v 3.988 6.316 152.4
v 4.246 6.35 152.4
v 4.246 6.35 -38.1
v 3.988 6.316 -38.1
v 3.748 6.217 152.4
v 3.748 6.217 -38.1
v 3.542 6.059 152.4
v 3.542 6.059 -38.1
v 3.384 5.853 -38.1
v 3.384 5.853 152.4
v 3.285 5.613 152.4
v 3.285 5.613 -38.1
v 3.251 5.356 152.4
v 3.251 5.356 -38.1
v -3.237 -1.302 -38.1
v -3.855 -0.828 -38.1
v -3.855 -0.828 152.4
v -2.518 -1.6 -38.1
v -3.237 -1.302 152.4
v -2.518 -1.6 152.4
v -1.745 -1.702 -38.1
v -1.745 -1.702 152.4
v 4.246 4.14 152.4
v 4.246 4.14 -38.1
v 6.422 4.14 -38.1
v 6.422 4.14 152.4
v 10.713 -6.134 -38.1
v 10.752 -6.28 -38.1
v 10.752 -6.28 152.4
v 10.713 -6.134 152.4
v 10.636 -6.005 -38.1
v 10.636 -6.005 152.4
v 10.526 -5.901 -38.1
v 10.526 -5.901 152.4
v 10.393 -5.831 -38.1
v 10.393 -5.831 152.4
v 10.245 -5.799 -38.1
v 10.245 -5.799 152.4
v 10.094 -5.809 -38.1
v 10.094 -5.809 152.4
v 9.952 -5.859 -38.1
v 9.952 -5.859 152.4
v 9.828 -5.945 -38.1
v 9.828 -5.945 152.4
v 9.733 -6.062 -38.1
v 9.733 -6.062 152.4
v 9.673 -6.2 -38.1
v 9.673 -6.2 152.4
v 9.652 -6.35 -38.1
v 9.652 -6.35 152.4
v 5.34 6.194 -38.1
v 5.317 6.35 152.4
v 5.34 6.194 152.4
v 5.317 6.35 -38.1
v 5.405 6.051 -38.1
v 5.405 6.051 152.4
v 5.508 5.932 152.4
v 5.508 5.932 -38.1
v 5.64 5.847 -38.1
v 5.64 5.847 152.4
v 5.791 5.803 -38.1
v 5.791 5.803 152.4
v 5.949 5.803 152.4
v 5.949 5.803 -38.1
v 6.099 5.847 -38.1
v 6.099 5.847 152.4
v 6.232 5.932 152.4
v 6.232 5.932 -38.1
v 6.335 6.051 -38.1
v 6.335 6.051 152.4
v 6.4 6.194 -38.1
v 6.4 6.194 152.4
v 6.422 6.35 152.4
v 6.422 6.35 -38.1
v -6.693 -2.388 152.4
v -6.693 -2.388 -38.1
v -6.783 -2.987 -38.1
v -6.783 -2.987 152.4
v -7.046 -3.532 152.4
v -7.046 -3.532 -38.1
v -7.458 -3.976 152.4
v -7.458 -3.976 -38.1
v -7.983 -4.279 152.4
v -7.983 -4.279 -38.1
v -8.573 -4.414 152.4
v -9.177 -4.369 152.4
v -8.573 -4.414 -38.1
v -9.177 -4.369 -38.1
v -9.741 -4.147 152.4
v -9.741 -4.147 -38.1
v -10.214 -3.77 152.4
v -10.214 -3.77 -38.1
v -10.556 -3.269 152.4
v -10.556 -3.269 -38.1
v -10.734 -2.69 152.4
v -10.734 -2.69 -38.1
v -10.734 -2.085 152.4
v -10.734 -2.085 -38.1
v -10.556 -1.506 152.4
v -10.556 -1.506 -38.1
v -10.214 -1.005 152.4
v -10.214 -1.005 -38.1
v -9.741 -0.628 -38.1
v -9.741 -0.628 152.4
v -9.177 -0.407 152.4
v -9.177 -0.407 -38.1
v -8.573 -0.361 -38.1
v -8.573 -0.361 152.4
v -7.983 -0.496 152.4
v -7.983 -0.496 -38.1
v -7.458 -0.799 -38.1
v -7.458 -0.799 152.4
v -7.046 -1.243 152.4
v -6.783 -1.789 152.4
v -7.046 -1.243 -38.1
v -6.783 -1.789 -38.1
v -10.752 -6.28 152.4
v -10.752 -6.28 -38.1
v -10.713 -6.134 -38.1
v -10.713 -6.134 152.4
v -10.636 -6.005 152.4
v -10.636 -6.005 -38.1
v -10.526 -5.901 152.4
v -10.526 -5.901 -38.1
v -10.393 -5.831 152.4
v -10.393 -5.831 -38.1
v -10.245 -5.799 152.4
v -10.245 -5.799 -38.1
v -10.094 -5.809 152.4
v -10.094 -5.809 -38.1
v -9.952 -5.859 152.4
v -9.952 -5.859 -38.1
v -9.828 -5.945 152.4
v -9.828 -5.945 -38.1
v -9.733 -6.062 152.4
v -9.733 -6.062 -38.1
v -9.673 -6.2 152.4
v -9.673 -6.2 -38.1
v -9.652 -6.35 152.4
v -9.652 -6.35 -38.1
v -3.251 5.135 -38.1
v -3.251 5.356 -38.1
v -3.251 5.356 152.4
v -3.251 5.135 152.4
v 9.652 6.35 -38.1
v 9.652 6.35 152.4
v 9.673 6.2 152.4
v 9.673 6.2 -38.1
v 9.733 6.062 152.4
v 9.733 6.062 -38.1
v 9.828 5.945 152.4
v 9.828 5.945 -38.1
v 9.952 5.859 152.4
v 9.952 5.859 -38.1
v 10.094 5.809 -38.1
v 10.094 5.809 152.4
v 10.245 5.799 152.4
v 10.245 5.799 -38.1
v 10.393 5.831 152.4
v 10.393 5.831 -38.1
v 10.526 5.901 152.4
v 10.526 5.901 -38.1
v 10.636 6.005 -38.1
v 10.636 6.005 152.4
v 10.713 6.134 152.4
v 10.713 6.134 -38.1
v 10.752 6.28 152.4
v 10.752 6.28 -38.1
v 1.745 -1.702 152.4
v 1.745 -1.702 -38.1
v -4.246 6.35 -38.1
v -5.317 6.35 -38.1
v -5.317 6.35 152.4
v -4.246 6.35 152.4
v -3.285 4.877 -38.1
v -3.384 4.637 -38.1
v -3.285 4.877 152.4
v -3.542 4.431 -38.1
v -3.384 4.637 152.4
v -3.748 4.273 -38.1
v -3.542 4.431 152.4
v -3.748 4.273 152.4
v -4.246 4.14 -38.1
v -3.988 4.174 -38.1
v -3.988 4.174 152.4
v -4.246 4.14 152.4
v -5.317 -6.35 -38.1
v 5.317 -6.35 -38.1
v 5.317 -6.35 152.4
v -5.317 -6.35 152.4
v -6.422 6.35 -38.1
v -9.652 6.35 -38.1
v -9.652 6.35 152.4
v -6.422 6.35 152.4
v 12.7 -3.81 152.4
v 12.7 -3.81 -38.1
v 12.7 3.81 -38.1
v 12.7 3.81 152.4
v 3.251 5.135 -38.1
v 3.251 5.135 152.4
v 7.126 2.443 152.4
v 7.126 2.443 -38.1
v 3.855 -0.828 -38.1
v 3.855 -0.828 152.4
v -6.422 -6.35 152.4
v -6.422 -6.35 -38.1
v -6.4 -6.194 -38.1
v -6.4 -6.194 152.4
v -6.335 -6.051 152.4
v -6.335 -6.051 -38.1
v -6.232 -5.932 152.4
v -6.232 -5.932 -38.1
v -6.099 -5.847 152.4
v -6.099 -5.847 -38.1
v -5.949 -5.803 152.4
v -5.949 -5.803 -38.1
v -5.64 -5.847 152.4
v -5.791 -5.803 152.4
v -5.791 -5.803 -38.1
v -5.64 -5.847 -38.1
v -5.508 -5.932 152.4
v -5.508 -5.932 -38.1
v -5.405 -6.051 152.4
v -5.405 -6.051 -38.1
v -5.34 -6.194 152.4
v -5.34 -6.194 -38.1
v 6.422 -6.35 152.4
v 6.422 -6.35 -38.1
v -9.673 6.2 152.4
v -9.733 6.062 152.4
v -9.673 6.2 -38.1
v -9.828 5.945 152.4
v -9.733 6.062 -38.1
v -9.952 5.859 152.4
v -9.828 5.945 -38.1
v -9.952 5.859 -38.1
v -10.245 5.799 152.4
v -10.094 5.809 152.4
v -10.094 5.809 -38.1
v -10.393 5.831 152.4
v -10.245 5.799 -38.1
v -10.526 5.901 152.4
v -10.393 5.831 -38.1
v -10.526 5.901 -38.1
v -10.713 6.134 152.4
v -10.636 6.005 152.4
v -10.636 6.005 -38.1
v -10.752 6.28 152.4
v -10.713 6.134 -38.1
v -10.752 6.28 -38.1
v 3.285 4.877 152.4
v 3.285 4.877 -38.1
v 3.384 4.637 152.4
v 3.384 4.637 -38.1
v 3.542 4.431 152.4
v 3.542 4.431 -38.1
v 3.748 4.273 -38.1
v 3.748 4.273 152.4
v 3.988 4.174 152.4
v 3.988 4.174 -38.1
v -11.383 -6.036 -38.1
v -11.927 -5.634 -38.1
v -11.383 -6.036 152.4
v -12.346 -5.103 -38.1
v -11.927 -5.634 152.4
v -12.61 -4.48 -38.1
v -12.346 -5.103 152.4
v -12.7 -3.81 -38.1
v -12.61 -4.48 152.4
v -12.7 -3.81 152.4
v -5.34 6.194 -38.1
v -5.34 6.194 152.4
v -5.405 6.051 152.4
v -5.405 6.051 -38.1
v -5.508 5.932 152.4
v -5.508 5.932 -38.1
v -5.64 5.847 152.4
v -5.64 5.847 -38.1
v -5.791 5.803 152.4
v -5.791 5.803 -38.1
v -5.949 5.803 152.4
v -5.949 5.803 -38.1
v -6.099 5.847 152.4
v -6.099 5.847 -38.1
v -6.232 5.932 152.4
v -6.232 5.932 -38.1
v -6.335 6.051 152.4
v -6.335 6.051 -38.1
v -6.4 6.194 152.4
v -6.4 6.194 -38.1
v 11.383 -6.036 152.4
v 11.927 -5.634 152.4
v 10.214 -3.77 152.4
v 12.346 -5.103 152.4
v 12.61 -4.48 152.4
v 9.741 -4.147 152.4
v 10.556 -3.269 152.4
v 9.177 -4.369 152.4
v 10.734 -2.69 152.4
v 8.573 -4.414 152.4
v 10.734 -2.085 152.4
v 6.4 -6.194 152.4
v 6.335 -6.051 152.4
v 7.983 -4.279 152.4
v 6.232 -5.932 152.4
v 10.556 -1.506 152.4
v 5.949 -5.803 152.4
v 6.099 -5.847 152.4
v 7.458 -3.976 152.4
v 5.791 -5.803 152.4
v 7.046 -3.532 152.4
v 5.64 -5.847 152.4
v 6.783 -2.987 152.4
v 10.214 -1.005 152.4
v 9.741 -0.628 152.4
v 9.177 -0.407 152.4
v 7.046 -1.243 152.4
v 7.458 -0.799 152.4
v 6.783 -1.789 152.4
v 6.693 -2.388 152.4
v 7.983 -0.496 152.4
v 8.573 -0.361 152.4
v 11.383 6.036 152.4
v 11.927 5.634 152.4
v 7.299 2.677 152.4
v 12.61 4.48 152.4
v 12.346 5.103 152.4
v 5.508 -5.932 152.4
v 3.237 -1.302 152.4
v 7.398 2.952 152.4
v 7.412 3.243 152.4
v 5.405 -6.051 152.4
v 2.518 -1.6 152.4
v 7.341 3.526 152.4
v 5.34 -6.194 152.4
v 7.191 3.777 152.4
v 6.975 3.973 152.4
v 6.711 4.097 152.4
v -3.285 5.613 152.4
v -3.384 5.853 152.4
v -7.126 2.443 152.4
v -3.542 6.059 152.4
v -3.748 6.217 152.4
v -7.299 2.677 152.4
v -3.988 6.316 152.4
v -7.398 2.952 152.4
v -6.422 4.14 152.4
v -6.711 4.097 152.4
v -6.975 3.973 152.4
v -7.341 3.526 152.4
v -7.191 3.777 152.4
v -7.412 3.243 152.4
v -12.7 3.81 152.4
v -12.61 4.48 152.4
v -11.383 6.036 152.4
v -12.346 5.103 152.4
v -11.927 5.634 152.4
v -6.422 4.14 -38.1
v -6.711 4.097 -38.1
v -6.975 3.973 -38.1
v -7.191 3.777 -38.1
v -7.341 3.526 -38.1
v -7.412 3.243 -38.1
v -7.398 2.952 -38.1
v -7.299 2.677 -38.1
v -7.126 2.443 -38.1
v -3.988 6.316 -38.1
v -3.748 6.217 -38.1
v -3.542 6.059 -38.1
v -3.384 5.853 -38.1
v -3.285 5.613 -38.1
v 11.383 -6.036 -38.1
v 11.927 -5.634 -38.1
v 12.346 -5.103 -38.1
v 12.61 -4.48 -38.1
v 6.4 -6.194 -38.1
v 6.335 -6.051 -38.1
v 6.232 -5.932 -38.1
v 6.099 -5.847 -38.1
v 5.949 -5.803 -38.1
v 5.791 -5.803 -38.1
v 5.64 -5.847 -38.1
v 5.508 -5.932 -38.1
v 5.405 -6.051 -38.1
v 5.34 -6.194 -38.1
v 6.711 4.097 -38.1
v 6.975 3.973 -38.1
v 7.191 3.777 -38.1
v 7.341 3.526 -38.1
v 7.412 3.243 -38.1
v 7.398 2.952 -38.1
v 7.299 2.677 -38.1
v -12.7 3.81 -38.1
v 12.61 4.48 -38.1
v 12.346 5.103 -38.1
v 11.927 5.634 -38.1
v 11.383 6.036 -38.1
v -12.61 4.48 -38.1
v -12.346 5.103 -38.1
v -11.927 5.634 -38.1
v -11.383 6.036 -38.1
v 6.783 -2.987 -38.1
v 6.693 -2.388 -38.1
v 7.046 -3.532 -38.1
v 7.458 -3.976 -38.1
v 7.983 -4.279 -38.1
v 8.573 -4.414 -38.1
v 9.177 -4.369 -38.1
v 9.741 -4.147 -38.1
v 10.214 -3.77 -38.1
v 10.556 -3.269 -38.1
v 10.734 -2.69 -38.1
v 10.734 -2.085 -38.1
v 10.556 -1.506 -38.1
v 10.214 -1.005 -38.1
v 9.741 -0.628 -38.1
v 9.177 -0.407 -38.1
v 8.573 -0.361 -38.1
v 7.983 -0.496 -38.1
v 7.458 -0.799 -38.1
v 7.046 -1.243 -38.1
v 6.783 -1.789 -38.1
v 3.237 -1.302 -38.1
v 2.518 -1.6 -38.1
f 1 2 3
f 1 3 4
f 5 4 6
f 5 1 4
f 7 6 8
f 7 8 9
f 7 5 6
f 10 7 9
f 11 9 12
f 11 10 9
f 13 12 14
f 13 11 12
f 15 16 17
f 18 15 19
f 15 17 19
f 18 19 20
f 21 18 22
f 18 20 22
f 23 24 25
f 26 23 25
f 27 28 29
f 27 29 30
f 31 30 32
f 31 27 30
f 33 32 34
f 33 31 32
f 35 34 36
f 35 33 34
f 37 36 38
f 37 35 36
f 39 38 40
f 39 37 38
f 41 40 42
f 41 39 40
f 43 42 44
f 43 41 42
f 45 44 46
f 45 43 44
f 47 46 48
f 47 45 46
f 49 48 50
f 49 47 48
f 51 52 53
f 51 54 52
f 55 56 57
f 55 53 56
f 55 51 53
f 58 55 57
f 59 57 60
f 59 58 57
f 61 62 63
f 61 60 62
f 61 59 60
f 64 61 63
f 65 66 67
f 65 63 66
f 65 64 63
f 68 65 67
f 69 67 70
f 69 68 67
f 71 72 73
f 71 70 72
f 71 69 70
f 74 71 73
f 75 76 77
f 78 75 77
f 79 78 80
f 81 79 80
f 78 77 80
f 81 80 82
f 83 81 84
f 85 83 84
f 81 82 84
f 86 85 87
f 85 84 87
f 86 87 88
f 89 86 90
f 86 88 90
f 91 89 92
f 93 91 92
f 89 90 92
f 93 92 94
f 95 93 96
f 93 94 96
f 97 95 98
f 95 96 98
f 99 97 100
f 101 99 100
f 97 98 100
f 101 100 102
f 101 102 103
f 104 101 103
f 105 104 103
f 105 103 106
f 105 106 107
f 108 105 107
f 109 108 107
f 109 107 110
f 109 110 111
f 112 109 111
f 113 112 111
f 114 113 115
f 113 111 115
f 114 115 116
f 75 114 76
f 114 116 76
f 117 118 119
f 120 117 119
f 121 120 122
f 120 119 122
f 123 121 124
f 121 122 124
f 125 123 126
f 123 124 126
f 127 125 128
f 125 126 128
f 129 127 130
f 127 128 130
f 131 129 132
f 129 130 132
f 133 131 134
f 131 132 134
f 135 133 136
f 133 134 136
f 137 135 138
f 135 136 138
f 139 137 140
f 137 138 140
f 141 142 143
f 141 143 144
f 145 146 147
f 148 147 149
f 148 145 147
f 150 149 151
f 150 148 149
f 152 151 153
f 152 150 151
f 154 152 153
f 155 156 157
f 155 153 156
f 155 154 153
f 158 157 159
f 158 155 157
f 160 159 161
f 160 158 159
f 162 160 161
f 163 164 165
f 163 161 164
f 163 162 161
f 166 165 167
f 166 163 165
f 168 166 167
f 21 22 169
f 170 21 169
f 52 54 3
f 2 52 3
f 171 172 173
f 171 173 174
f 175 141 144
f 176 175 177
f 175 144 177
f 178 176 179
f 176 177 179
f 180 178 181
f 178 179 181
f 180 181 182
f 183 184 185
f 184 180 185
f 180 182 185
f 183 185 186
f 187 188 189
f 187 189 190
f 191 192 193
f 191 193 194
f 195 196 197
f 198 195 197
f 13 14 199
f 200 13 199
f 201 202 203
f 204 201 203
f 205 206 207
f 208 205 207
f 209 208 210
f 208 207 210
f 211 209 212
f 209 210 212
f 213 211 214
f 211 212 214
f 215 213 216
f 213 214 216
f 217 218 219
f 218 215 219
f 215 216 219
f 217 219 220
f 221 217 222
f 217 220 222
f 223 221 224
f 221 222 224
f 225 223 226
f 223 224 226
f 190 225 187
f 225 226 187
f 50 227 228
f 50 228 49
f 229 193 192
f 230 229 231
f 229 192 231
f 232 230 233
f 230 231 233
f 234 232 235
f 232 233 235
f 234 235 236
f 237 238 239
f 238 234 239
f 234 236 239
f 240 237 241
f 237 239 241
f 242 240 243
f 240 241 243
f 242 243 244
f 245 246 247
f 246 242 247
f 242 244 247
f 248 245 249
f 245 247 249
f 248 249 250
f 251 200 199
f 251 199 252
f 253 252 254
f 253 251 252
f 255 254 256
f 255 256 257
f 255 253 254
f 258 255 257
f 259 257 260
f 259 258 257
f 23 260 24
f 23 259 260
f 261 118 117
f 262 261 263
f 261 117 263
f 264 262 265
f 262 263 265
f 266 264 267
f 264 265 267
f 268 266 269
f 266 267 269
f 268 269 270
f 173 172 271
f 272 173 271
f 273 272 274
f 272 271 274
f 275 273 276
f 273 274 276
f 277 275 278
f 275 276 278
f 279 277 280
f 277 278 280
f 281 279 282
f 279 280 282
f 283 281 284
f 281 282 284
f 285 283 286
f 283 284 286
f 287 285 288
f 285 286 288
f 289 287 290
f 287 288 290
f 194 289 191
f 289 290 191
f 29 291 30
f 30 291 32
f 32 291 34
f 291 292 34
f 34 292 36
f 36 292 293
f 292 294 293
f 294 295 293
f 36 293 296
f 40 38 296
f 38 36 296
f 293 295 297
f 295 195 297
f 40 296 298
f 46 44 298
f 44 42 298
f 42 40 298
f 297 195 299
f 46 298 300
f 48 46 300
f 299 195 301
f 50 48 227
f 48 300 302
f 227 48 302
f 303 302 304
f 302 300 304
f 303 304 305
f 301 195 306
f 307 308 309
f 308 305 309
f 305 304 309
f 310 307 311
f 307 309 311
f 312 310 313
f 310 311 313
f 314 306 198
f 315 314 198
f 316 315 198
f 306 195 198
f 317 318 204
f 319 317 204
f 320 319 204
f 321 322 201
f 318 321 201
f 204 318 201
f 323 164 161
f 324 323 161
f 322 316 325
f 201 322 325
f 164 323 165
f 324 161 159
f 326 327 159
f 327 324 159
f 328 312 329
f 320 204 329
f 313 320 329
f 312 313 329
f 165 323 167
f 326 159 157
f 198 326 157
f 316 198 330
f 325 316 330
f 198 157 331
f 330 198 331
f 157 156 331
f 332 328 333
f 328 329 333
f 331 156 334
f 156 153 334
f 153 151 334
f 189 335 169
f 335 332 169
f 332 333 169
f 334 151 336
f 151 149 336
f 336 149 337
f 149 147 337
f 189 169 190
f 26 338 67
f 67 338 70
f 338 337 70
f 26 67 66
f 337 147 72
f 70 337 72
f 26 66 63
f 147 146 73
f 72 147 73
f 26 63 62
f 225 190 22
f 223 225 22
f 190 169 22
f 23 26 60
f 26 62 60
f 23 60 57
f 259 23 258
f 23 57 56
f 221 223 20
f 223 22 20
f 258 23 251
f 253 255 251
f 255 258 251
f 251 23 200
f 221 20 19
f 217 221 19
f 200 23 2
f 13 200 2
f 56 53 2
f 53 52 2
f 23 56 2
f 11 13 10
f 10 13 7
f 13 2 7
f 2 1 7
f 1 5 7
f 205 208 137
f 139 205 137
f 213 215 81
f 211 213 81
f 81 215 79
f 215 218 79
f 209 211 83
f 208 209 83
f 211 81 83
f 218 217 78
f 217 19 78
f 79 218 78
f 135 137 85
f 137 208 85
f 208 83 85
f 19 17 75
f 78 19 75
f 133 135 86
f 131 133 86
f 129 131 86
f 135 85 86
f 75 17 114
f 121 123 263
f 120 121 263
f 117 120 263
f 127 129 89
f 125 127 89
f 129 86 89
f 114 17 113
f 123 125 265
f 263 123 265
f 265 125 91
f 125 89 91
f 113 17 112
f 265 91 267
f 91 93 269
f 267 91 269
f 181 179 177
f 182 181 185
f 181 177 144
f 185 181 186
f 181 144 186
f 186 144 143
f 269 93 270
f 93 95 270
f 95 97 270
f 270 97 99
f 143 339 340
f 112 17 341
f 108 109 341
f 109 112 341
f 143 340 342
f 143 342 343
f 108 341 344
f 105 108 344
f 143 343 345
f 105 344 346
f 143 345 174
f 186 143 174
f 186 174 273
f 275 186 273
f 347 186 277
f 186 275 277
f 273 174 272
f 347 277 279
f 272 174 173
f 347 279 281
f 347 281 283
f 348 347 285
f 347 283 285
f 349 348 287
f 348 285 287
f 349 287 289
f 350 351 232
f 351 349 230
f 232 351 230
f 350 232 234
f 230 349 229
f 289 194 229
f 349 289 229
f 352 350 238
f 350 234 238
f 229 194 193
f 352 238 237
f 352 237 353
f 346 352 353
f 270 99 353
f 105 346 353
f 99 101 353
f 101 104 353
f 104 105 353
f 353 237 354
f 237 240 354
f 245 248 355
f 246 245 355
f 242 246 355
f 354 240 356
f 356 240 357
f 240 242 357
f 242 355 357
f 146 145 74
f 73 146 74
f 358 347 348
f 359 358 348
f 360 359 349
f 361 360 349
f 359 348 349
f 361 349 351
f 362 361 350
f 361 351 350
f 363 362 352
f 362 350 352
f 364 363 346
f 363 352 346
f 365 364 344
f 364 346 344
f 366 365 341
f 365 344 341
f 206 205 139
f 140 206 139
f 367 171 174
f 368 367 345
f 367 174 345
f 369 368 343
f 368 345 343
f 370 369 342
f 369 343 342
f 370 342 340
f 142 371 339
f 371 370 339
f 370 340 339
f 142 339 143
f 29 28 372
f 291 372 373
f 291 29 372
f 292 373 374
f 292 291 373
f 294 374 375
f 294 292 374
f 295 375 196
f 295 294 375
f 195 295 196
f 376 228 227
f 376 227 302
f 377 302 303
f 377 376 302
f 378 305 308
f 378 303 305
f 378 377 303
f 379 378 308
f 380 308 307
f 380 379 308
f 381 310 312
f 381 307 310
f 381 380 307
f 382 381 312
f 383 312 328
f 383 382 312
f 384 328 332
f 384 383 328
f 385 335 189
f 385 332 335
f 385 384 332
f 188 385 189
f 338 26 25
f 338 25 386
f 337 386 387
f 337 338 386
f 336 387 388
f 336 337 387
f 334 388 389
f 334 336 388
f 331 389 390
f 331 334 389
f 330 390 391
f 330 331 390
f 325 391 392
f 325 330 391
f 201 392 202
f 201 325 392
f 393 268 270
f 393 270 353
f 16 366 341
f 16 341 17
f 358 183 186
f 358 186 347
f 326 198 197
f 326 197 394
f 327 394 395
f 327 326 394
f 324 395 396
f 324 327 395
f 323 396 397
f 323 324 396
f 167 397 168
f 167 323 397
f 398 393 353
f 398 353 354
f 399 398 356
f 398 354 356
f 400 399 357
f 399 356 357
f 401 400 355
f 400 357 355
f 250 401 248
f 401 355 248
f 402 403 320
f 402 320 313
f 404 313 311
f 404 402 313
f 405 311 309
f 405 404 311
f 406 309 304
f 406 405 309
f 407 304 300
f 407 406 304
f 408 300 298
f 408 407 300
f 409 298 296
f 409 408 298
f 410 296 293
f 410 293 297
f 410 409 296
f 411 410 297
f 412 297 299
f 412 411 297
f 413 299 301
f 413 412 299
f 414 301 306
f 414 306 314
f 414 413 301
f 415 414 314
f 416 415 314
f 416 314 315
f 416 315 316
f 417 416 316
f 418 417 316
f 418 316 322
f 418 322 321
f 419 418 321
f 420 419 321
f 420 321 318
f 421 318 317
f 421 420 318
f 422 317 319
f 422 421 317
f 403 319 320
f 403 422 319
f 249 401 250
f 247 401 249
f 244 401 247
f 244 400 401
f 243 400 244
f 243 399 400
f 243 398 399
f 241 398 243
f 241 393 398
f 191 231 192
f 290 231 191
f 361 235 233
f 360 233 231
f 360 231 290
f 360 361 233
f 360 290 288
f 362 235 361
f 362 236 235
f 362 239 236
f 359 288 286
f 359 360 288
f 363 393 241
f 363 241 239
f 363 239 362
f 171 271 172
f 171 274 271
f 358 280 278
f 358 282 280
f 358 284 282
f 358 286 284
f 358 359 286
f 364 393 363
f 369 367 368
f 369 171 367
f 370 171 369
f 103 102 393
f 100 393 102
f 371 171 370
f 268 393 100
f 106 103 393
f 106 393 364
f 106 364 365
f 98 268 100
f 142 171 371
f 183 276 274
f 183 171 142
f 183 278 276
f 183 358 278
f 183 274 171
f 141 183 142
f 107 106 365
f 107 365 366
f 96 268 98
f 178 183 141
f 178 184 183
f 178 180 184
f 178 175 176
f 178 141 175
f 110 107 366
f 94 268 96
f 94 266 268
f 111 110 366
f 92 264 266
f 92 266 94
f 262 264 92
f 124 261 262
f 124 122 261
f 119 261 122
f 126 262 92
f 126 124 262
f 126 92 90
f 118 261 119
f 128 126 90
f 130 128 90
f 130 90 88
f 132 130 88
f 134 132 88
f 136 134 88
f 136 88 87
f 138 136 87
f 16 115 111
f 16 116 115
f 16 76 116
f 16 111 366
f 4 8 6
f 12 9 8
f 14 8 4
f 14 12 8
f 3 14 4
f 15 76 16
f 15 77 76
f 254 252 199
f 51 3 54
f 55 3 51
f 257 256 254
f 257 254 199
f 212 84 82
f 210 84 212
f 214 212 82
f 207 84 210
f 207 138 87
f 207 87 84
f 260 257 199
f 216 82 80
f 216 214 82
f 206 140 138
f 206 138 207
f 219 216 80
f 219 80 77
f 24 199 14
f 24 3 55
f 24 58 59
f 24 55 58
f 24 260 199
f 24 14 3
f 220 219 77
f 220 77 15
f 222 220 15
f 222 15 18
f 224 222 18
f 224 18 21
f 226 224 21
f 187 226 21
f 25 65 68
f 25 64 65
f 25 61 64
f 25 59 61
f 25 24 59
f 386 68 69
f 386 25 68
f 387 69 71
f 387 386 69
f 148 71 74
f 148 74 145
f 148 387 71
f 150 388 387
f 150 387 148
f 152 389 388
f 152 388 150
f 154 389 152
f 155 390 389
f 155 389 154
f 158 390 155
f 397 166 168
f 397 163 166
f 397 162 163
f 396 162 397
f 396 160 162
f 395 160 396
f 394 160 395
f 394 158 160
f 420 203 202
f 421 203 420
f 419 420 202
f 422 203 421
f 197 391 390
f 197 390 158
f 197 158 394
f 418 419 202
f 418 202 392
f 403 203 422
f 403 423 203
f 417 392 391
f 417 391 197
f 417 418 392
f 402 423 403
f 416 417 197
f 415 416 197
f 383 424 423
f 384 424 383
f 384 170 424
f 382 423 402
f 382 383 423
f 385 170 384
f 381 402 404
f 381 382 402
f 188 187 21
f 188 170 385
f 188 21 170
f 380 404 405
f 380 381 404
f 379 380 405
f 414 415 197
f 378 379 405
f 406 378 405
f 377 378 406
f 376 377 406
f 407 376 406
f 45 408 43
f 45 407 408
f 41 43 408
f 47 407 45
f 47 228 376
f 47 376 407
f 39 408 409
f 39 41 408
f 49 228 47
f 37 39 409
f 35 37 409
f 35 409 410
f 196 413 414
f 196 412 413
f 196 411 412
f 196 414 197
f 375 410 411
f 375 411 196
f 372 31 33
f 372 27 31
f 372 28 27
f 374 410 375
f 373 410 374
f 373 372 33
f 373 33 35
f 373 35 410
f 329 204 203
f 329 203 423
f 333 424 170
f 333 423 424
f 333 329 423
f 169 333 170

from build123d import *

# Parameters (mm, degrees)
SKETCH3_R               = 2.032
BOSS_EXTRUDE1_DEPTH     = 152.4
CUT_EXTRUDE1_DEPTH      = 154.060029074
CUT_EXTRUDE1_DEPTH_BACK = 154.060029074
SKETCH4_R               = 0.55245
SKETCH5_W               = 50.8
SKETCH5_H               = 114.3
CUT_EXTRUDE2_DEPTH      = 154.454683865


with BuildPart() as part:
    # Sketch3 → Boss-Extrude1 (new, symmetric)
    with BuildSketch(Plane.XY):
        with BuildLine():
            Line((3.2512, 5.35559), (3.2512, 5.13461))
            ThreePointArc((3.2512, 5.13461), (3.542455946, 4.431455946), (4.24561, 4.1402))
            Line((4.24561, 4.1402), (6.42239, 4.1402))
            ThreePointArc((6.42239, 4.1402), (7.341105046, 3.526334232), (7.125544054, 2.442635946))
            Line((7.125544054, 2.442635946), (3.854875946, -0.828032163))
            ThreePointArc((3.854875946, -0.828032163), (2.887046479, -1.474715138), (1.745413783, -1.7018))
            Line((1.745413783, -1.7018), (0, -1.7018))
            Line((0, -1.7018), (0, -6.35))
            Line((0, -6.35), (10.16, -6.35))
            ThreePointArc((10.16, -6.35), (11.956051224, -5.606051224), (12.7, -3.81))
            Line((12.7, -3.81), (12.7, 3.81))
            ThreePointArc((12.7, 3.81), (11.956051224, 5.606051224), (10.16, 6.35))
            Line((10.16, 6.35), (4.24561, 6.35))
            ThreePointArc((4.24561, 6.35), (3.542455946, 6.058744054), (3.2512, 5.35559))
        make_face()
        with Locations(Location((8.7249, -2.3876, 0), (0, 0, 180))):
            Circle(SKETCH3_R, mode=Mode.SUBTRACT)
    extrude(amount=BOSS_EXTRUDE1_DEPTH, both=True)

    # Sketch4 → Cut-Extrude1 (cut, two sides: drawn at the far end of the back side and taken through both)
    with BuildSketch(Plane.XY.offset(-CUT_EXTRUDE1_DEPTH_BACK)):
        with Locations((5.86994, 6.35)):
            Circle(SKETCH4_R)
        with Locations((10.20445, 6.35)):
            Circle(SKETCH4_R)
        with Locations((5.86994, -6.35)):
            Circle(SKETCH4_R)
        with Locations((10.20445, -6.35)):
            Circle(SKETCH4_R)
    extrude(amount=CUT_EXTRUDE1_DEPTH + CUT_EXTRUDE1_DEPTH_BACK, mode=Mode.SUBTRACT)

    # Mirror1: part across plane


with BuildPart() as part_1:
    add(part.part)
    add(part.part.mirror(Plane(origin=(0, 0, 0), x_dir=(0, 0, 1), z_dir=(1, 0, 0))))

    # Sketch5 → Cut-Extrude2 (cut, through all)
    with BuildSketch(Plane.XZ.offset(6.35)):
        with Locations((0, -95.25)):
            Rectangle(SKETCH5_W, SKETCH5_H)
    extrude(amount=-CUT_EXTRUDE2_DEPTH, mode=Mode.SUBTRACT)


solid = part_1.part
